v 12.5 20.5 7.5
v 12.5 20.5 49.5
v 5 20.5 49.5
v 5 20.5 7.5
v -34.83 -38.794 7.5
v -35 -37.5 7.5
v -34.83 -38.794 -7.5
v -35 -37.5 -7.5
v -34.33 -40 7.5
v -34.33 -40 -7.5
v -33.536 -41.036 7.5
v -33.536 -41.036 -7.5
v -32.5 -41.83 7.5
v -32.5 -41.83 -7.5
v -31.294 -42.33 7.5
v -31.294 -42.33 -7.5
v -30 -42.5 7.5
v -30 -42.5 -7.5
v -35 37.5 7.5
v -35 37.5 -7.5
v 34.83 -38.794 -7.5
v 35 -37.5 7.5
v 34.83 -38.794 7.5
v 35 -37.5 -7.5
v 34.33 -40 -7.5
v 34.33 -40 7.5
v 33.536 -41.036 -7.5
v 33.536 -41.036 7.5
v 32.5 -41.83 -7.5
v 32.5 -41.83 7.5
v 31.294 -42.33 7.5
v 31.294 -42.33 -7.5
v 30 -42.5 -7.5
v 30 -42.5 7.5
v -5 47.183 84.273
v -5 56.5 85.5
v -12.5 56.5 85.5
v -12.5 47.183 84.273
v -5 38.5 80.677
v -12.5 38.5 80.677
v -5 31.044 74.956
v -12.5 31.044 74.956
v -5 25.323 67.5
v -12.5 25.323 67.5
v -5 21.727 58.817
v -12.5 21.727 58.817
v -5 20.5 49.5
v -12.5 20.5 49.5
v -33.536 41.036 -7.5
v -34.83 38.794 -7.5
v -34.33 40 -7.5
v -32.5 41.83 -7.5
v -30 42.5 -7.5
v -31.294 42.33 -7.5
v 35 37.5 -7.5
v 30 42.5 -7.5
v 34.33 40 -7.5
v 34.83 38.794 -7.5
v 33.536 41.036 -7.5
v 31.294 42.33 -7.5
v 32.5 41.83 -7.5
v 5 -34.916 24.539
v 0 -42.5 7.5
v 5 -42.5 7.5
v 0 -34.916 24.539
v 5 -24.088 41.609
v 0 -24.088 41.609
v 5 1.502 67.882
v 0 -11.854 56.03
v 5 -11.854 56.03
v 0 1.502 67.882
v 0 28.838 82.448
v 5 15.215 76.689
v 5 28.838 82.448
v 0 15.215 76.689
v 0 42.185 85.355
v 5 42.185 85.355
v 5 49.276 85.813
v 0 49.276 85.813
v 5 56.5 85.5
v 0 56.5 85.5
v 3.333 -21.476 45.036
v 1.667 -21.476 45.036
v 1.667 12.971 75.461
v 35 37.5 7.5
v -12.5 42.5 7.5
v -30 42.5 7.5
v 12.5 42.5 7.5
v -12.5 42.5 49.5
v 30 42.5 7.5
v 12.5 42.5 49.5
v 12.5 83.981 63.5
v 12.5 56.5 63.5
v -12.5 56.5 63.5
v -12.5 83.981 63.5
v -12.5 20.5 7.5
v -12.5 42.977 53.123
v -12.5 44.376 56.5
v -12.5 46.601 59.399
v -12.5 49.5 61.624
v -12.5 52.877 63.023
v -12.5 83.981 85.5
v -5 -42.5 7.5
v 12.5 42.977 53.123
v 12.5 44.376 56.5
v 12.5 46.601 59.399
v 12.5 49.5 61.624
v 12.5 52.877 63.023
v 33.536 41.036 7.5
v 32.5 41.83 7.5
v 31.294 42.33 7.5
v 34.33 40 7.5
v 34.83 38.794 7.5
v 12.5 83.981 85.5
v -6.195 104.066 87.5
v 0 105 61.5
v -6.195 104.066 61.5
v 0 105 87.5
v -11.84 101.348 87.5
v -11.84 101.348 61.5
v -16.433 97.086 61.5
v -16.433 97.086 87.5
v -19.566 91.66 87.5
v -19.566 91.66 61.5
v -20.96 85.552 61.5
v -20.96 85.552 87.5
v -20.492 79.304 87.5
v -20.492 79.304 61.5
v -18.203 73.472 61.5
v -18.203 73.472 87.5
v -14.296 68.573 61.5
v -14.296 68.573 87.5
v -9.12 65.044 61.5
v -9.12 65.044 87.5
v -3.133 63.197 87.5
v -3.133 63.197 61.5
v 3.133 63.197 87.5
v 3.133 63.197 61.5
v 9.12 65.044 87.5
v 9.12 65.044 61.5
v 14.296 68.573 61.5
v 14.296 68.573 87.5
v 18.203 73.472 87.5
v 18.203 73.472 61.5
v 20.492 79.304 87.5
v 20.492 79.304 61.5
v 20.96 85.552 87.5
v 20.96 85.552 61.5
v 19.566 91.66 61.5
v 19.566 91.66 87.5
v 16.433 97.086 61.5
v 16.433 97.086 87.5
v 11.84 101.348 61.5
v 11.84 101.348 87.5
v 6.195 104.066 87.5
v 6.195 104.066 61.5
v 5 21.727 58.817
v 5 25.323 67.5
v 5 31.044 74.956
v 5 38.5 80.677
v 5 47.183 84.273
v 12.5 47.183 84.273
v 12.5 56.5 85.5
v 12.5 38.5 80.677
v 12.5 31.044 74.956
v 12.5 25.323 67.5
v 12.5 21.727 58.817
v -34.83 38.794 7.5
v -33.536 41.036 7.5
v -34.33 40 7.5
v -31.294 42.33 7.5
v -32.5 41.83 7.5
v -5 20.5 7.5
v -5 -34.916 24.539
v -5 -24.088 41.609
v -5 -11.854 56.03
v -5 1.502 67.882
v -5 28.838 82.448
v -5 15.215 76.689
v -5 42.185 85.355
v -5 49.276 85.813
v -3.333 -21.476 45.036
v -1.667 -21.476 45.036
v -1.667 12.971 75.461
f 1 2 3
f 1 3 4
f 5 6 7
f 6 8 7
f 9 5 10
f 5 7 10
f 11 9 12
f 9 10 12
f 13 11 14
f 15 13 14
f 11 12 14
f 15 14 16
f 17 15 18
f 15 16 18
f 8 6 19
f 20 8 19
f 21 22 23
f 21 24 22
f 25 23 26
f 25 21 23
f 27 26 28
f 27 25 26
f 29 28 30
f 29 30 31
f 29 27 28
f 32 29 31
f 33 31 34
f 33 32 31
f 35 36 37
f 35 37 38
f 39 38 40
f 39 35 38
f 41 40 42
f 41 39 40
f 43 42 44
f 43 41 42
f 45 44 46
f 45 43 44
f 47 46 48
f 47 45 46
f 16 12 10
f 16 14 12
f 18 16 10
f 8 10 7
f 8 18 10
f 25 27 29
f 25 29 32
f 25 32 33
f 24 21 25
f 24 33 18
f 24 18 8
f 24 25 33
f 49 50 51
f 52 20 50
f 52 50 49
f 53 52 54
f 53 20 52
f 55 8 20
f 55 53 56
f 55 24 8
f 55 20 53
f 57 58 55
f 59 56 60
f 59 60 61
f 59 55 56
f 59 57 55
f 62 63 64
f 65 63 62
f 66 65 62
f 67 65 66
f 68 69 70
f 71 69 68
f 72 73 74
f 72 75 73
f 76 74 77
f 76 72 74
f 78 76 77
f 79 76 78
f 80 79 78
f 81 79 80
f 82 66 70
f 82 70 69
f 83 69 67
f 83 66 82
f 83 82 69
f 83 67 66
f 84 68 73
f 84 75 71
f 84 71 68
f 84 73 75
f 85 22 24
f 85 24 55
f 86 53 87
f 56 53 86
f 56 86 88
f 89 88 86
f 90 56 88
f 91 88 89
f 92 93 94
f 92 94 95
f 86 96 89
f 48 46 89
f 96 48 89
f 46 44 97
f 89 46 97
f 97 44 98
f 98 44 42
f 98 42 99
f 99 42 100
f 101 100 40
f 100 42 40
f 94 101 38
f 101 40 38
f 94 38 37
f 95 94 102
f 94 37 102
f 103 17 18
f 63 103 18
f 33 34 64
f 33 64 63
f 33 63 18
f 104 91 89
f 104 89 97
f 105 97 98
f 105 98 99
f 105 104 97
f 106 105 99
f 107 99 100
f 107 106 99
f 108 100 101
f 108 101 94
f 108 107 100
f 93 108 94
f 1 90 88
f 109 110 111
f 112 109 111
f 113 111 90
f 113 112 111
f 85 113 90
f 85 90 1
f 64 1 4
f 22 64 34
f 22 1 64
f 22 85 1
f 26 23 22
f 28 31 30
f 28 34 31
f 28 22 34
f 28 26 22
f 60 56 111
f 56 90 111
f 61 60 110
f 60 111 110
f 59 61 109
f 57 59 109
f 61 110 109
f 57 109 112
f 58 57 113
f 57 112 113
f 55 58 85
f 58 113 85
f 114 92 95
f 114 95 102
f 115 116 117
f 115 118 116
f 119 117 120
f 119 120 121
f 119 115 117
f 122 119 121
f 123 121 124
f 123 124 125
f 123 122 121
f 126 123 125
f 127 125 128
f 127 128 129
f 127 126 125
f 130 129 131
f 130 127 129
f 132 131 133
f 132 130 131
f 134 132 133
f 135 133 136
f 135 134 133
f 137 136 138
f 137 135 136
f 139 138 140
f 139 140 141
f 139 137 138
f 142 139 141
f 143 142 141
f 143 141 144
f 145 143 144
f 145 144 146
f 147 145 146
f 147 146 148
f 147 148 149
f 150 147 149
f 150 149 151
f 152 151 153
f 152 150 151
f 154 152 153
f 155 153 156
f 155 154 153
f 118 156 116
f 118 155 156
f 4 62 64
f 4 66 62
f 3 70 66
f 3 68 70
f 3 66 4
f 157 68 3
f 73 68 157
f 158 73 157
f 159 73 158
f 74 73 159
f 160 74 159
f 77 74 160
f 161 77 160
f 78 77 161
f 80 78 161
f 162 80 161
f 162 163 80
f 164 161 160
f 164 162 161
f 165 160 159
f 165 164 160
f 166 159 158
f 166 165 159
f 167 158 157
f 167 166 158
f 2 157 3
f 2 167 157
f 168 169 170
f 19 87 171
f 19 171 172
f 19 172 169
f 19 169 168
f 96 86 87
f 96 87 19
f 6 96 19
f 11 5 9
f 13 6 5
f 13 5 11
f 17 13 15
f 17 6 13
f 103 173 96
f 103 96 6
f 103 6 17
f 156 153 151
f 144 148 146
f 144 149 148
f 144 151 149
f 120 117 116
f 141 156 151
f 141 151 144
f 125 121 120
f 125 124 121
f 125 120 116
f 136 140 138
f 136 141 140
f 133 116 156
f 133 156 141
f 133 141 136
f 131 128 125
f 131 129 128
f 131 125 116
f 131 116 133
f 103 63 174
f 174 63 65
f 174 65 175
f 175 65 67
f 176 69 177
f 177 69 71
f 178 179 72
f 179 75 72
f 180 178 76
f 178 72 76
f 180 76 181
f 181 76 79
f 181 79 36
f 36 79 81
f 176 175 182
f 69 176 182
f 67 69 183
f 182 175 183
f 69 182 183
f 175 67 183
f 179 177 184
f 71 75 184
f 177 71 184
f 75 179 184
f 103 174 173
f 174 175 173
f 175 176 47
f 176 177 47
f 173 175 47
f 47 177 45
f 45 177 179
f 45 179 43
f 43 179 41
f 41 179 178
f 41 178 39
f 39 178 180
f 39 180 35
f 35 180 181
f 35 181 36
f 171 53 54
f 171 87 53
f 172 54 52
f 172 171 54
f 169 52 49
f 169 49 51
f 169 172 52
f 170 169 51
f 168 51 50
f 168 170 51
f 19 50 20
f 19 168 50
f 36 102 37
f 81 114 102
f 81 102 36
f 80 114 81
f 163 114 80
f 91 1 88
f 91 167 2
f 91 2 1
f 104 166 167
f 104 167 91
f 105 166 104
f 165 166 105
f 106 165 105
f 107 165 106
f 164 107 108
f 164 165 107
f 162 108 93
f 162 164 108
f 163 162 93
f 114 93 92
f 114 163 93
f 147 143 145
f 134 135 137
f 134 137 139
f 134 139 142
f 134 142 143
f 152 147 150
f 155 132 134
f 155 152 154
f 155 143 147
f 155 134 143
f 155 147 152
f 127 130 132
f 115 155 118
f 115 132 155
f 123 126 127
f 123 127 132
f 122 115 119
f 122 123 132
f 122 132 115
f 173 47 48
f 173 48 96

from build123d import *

# Parameters (mm, degrees)
F1_DEPTH = 35
F0_W     = 13.9812313979
F0_H     = 22
F2_DEPTH = 12.5
F3_DEPTH = 5
F5_R     = 5


with BuildPart() as f1:
    # F0 (on Right) → F1 (new body, symmetric)
    with BuildSketch(Plane.YZ):
        Polygon((42.5, -7.5), (42.5, 7.5), (20.5, 7.5), (-42.5, 7.5), (-42.5, -7.5), align=None)
    extrude(amount=F1_DEPTH, both=True)

    # F0 (on Right) → F2 (join, symmetric)
    with BuildSketch(Plane.YZ):
        with BuildLine():
            Line((20.5, 7.5), (42.5, 7.5))
            Line((42.5, 7.5), (42.5, 49.5))
            ThreePointArc((42.5, 49.5), (46.6005050634, 59.3994949366), (56.5, 63.5))
            Line((56.5, 63.5), (70, 63.5))
            Line((70, 63.5), (70, 85.5))
            Line((70, 85.5), (56.5, 85.5))
            ThreePointArc((56.5, 85.5), (31.0441558773, 74.9558441227), (20.5, 49.5))
            Line((20.5, 49.5), (20.5, 7.5))
        make_face()
        with Locations((76.9906156989, 74.5)):
            Rectangle(F0_W, F0_H)
    extrude(amount=F2_DEPTH, both=True)

    # F0 (on Right) → F3 (join, symmetric)
    with BuildSketch(Plane.YZ):
        with BuildLine():
            Line((-42.5, 7.5), (20.5, 7.5))
            Line((20.5, 7.5), (20.5, 49.5))
            ThreePointArc((20.5, 49.5), (31.0441558773, 74.9558441227), (56.5, 85.5))
            add(Edge.make_bspline(
                [(-42.5, 7.5), (-29.6354852617, 44.1676005125), (9.8784975708, 90.0786296129), (56.5, 85.5)],
                knots=[0, 0, 0, 0, 126.0357092256, 126.0357092256, 126.0357092256, 126.0357092256], degree=3))
        make_face()
    extrude(amount=F3_DEPTH, both=True)

    # F5
    f5_edges = [f1.edges().sort_by_distance(p)[0] for p in [
        (35, 42.5, 0),
        (-35, 42.5, 0),
        (35, -42.5, 0),
        (-35, -42.5, 0),
    ]]
    fillet(f5_edges, radius=F5_R)


with BuildPart() as f4:
    # F0 (on Right) → F4 (revolve)
    with BuildSketch(Plane.YZ):
        Polygon((83.9812313979, 85.5), (83.9812313979, 63.5), (83.9812313979, 61.5), (105, 61.5), (105, 87.5), (83.9812313979, 87.5), align=None)
    revolve(axis=Axis((0, 83.9812313979, 74.5), (0, 0, 1)))


solid = Compound([f1.part, f4.part])
